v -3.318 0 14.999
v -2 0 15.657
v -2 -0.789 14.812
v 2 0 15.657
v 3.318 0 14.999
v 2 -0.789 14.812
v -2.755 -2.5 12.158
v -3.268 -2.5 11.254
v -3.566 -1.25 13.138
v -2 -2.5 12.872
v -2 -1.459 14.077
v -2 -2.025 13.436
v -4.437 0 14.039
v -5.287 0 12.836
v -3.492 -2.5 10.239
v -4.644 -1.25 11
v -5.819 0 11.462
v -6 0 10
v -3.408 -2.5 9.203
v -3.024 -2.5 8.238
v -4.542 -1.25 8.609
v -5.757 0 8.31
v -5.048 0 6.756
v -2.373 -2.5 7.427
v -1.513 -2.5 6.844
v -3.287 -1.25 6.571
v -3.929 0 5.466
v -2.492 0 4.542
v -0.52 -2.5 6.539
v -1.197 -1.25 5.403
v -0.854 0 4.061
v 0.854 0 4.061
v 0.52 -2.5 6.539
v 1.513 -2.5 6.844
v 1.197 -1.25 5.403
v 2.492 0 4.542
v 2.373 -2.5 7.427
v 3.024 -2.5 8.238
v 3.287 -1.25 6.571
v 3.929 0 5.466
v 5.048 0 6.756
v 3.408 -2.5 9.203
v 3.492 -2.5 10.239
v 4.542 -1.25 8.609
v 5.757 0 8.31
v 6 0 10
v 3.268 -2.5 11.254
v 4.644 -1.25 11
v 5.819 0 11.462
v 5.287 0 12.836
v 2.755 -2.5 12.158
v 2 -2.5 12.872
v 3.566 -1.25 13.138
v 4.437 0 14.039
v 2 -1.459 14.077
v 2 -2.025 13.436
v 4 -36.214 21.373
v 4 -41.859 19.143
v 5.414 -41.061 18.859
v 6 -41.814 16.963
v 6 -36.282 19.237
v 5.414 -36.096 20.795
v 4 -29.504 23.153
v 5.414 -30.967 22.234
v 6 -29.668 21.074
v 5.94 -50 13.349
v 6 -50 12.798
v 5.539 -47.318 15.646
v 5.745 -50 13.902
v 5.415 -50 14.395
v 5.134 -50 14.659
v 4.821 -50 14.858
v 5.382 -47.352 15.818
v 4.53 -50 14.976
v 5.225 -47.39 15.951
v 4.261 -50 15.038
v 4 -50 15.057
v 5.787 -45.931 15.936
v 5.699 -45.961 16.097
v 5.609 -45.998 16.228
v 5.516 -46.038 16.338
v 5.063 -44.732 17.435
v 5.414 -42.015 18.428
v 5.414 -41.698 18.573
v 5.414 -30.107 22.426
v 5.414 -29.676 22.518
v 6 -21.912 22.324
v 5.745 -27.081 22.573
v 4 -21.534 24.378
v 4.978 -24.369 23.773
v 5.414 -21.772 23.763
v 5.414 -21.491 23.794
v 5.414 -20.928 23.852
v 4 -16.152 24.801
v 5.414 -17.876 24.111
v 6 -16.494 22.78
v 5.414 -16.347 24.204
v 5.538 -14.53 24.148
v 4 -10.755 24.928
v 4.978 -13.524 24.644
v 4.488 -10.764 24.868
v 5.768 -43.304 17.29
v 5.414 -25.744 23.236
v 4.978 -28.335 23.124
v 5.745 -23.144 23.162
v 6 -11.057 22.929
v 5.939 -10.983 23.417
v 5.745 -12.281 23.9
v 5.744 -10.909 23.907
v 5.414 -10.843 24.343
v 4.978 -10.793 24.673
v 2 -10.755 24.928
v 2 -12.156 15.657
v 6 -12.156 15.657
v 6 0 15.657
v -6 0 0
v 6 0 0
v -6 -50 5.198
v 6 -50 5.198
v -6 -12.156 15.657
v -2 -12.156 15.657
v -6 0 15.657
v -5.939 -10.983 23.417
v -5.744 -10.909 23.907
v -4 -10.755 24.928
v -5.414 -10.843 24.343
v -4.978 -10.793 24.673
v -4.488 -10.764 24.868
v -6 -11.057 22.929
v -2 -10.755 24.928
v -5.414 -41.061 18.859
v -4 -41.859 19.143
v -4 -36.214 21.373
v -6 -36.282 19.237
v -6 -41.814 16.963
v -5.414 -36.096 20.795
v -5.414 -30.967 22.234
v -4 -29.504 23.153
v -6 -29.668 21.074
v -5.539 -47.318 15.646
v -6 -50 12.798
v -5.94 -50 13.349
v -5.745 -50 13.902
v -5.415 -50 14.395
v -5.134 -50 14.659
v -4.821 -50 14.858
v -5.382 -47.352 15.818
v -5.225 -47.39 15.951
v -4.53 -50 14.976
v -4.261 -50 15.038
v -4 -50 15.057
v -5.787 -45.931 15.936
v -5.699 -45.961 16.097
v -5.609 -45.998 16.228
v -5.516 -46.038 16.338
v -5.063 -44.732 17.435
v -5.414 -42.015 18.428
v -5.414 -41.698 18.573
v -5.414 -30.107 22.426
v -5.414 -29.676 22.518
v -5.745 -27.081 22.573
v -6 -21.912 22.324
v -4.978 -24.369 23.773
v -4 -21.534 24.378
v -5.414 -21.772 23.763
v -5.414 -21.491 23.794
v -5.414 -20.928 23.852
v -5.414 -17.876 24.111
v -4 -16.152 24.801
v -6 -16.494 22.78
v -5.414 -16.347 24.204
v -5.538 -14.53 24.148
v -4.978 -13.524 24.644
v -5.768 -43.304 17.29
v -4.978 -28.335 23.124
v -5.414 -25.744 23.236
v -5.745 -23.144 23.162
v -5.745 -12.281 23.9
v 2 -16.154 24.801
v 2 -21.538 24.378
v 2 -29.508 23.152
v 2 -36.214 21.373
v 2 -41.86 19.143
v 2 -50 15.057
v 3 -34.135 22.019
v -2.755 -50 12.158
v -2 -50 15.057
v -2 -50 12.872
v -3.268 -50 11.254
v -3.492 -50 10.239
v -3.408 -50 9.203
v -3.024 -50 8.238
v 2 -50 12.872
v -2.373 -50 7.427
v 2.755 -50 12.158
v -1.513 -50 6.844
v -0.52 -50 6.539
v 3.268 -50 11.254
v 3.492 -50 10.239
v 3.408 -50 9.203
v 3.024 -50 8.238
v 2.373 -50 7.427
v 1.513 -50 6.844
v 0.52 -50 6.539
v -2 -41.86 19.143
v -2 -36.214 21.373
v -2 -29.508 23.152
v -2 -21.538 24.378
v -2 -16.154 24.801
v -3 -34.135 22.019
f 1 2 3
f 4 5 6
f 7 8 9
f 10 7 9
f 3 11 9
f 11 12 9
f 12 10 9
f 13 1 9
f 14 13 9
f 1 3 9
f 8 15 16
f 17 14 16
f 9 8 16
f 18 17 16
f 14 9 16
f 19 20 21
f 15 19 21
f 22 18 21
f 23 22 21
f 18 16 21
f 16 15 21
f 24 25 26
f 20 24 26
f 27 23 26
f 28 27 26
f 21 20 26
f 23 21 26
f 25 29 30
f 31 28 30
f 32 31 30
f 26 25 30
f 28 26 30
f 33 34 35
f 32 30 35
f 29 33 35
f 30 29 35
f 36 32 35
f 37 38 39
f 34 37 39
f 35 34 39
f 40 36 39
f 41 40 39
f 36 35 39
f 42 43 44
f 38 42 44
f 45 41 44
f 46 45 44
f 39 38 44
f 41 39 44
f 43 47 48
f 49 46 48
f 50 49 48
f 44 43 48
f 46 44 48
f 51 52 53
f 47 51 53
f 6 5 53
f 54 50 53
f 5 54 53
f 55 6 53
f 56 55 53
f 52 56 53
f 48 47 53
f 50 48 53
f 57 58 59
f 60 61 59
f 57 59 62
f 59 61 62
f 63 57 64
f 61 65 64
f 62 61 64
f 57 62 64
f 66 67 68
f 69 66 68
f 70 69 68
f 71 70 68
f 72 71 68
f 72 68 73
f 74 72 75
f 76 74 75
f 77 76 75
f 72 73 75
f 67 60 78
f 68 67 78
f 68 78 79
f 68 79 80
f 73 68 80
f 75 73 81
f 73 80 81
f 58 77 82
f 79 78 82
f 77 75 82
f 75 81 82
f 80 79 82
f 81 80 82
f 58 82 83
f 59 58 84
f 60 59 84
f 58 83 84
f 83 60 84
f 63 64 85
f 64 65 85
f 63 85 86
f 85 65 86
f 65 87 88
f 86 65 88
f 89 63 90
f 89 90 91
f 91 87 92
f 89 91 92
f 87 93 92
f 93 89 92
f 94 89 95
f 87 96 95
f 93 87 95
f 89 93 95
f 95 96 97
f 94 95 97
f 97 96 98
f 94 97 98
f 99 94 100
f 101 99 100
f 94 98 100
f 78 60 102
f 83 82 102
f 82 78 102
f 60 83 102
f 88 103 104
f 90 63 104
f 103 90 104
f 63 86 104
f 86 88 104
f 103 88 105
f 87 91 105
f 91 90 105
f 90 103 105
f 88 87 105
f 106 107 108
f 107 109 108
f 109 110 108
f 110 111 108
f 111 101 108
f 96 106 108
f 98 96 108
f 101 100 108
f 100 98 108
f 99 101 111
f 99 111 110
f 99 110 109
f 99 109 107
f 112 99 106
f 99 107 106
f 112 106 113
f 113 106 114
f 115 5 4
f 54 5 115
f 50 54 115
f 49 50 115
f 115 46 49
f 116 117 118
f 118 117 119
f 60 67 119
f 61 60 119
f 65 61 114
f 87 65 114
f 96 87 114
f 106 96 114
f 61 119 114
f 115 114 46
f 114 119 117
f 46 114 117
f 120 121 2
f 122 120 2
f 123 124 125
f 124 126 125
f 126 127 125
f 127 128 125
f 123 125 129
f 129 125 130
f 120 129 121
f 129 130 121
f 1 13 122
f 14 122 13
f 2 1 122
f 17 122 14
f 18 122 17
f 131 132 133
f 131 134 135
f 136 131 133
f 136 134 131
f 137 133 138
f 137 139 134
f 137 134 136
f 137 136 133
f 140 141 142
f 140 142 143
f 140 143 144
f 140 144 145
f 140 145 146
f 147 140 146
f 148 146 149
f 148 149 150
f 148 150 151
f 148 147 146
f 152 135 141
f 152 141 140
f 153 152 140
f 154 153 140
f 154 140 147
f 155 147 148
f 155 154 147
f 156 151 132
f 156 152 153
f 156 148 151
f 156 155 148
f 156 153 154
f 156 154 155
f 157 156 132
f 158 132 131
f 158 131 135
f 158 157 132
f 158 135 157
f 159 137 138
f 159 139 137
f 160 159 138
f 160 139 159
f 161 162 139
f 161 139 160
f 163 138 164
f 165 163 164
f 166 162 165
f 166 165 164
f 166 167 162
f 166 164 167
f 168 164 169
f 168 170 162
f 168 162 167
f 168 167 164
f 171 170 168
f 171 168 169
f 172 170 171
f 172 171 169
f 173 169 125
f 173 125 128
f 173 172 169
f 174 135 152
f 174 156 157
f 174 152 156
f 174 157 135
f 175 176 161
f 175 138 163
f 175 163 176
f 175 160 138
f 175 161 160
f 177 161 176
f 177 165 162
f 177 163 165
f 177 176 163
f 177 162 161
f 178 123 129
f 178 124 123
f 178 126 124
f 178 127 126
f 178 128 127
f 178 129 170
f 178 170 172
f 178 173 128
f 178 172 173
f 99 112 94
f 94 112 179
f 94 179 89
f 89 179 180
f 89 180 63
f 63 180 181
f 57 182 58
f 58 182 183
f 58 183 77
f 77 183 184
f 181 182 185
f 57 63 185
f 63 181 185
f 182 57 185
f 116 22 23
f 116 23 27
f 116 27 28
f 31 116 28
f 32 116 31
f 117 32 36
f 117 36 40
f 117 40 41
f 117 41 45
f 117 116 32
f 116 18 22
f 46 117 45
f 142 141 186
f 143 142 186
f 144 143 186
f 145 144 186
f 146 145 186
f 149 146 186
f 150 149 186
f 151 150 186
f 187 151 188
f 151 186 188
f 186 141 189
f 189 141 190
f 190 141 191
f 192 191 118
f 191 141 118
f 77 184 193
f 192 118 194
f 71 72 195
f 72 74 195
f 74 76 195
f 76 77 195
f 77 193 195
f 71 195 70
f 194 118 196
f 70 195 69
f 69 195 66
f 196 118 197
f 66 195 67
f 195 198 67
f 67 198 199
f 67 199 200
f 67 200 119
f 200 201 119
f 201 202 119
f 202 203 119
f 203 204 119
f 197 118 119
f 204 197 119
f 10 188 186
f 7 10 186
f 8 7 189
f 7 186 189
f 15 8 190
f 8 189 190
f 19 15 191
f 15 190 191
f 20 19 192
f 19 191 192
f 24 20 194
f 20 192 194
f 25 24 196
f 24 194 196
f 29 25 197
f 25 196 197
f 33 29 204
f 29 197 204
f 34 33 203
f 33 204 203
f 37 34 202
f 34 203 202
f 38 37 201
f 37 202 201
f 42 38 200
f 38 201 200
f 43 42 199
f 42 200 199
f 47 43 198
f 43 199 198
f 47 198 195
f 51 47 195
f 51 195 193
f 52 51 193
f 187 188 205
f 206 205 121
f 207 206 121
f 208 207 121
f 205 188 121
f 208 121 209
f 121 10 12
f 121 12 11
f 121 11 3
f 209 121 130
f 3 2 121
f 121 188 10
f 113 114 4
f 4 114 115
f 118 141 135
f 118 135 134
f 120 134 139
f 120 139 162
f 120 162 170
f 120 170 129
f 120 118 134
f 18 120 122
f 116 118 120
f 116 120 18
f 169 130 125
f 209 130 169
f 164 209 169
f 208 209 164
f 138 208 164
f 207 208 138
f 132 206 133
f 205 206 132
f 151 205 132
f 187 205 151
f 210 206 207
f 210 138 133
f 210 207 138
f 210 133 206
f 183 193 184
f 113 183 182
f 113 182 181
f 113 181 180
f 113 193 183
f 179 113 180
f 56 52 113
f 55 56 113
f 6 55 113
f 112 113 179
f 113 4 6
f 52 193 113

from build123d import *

# Parameters (mm, degrees)
F0_W           = 12
F0_H           = 50
F1_DEPTH       = 30
F3_D           = 7
F3_CSINK_D     = 12
F3_CSINK_ANGLE = 90
F4_W           = 4
F4_H           = 17.1277186767
F5_DEPTH       = 50
F11_DEPTH      = 12.5
F12_R          = 2
F15_DEPTH      = 12.5


# Not quite as in the source:
# - two fillets or chamfers of one size are made in one step
# - the dataset's text gives a spline's control points without its knots; the knots are read off the source's solid


with BuildPart() as f1:
    # F0 (on Top) → F1 (new body)
    with BuildSketch(Plane.XY):
        with Locations((0, -25)):
            Rectangle(F0_W, F0_H)
    extrude(amount=F1_DEPTH)

    # F3 (through all)
    with Locations(Plane(origin=(0, 0, 0), x_dir=(1, 0, 0), z_dir=(0, 1, 0))):
        with Locations((0, -10)):
            CounterSinkHole(F3_D / 2, F3_CSINK_D / 2, counter_sink_angle=F3_CSINK_ANGLE)

    # F4 (on Front) → F5 (cut)
    with BuildSketch(Plane.XZ):
        with Locations((0, 21.4361406616)):
            Rectangle(F4_W, F4_H)
    extrude(amount=F5_DEPTH, mode=Mode.SUBTRACT)

    # F10 (on Right) → F11 (cut, symmetric)
    with BuildSketch(Plane.YZ):
        with BuildLine():
            Line((-12.1560385451, 15.6568542495), (0, 15.6568542495))
            Line((0, 15.6568542495), (0, 30))
            Line((0, 30), (-50, 30))
            Line((-50, 30), (-50, 15.0572415441))
            add(Edge.make_bspline(
                [(-10.7545843348, 24.9280158802), (-18.8047000422, 24.9610823092), (-34.6615045914, 23.1331099195), (-44.5054902356, 17.945709156), (-50, 15.0572415441)],
                knots=[0, 0, 0, 0, 0.5383520225, 1, 1, 1, 1], degree=3))
            Line((-10.7545843348, 24.9280158802), (-12.1560385451, 15.6568542495))
        make_face()
    extrude(amount=F11_DEPTH, both=True, mode=Mode.SUBTRACT)

    # F12
    f12_edges = [f1.edges().sort_by_distance(p)[0] for p in [
        (-6, -31.098721, 22.804231),
        (6, -31.098721, 22.804231),
    ]]
    fillet(f12_edges, radius=F12_R)

    # F14 (on Right) → F15 (cut, symmetric)
    with BuildSketch(Plane.YZ):
        Polygon((0, 0), (-50, 5.1978901029), (-50, 0), align=None)
    extrude(amount=F15_DEPTH, both=True, mode=Mode.SUBTRACT)


solid = f1.part
